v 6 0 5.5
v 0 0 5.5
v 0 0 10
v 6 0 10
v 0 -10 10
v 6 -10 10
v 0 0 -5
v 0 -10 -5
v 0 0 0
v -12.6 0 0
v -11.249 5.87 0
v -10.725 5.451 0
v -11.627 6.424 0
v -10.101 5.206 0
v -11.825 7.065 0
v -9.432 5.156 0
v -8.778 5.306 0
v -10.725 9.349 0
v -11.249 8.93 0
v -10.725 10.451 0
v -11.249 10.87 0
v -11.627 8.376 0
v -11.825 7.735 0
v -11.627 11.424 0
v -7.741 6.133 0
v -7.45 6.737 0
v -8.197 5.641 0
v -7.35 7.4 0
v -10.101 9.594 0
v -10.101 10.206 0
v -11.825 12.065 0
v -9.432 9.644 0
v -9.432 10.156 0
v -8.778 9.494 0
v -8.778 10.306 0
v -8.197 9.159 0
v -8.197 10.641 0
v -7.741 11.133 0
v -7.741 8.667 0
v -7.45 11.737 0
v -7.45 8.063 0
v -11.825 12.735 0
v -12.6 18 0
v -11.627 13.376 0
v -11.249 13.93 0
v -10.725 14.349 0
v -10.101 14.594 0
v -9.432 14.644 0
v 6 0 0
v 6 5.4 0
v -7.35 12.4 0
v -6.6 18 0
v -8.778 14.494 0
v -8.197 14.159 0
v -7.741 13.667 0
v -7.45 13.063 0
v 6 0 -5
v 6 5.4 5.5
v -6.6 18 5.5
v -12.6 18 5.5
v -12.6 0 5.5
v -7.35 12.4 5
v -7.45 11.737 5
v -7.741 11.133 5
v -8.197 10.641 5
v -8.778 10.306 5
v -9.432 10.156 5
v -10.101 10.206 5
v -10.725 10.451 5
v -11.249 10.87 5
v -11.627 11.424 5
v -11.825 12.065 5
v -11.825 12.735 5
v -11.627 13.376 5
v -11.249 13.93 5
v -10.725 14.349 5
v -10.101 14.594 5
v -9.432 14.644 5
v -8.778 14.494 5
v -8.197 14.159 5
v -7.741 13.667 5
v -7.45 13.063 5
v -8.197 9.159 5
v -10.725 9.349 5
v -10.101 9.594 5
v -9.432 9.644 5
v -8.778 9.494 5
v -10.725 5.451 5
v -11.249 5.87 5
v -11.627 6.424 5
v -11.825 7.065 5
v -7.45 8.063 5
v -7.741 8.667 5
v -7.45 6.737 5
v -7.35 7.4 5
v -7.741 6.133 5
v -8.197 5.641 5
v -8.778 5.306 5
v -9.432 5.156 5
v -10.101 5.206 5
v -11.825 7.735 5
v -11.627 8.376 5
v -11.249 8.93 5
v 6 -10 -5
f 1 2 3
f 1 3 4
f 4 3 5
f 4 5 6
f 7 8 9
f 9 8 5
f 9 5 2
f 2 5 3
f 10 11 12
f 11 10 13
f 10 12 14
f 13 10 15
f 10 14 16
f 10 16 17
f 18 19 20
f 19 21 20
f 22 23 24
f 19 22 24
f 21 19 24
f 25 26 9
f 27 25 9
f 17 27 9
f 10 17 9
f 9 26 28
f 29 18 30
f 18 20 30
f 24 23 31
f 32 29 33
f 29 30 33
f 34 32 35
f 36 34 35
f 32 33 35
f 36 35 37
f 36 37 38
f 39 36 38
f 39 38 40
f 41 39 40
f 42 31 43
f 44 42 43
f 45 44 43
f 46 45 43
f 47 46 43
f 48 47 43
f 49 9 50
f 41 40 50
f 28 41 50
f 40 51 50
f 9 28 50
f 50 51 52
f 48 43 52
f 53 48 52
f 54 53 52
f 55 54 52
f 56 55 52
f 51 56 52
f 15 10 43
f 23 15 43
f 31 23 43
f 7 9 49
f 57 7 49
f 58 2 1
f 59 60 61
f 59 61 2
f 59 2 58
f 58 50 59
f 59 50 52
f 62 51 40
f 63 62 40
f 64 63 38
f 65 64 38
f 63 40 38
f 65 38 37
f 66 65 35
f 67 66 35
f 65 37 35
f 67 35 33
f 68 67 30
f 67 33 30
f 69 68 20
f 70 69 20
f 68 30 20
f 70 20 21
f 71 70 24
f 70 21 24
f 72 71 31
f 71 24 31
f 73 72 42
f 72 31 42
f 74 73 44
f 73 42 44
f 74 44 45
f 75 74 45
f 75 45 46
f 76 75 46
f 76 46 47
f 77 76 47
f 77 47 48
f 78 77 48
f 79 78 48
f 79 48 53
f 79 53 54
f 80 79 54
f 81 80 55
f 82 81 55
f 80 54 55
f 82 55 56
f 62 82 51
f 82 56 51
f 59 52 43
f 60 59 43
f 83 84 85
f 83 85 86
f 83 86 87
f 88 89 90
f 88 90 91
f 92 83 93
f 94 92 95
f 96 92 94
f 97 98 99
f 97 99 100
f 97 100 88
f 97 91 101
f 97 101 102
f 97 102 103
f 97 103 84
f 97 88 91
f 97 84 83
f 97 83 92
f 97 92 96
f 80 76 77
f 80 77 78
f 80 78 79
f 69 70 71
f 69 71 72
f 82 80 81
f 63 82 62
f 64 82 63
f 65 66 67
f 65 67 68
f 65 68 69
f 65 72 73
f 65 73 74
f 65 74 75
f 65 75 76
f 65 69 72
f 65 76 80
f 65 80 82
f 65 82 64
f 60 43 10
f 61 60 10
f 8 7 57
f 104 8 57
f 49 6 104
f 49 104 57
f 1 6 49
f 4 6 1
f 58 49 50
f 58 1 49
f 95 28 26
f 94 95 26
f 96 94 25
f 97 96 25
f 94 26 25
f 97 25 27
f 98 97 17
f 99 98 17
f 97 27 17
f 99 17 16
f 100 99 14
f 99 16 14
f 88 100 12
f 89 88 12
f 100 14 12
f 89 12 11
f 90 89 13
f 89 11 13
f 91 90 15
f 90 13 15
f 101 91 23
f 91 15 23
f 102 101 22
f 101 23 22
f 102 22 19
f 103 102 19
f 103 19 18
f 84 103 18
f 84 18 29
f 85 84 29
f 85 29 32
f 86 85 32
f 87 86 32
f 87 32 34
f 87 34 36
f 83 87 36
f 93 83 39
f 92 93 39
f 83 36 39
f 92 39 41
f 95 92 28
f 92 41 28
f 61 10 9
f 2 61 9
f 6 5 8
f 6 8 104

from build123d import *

# Parameters (mm, degrees)
PAD_DEPTH         = 5.5
SKETCH001_W       = 6
SKETCH001_H       = 10
PAD001_DEPTH      = 4.5
PAD001_DEPTH_BACK = 10.5
SKETCH002_R       = 2.25
POCKET_DEPTH      = 5


with BuildPart() as part:
    # Sketch → Pad (new body)
    with BuildSketch(Plane.XY):
        Polygon((-12.6, 18), (-12.6, 0), (0, 0), (0, -10), (6, -10), (6, 5.4), (-6.6, 18), align=None)
    extrude(amount=PAD_DEPTH)

    # Sketch001 (on Face9 of Pad) → Pad001 (join, two sides)
    with BuildSketch(Plane.XY.offset(5.5)) as pad001_sk:
        with Locations((3, -5)):
            Rectangle(SKETCH001_W, SKETCH001_H)
    extrude(amount=PAD001_DEPTH)
    extrude(pad001_sk.sketch, amount=-PAD001_DEPTH_BACK)

    # Sketch002 (on Face4 of Pad001) → Pocket (cut)
    with BuildSketch(Plane(origin=(0, 0, 0), x_dir=(1, 0, 0), z_dir=(0, 0, -1))):
        with Locations((-9.6, -7.4)):
            Circle(SKETCH002_R)
        with Locations((-9.6, -12.4)):
            Circle(SKETCH002_R)
    extrude(amount=-POCKET_DEPTH, mode=Mode.SUBTRACT)


solid = part.part
